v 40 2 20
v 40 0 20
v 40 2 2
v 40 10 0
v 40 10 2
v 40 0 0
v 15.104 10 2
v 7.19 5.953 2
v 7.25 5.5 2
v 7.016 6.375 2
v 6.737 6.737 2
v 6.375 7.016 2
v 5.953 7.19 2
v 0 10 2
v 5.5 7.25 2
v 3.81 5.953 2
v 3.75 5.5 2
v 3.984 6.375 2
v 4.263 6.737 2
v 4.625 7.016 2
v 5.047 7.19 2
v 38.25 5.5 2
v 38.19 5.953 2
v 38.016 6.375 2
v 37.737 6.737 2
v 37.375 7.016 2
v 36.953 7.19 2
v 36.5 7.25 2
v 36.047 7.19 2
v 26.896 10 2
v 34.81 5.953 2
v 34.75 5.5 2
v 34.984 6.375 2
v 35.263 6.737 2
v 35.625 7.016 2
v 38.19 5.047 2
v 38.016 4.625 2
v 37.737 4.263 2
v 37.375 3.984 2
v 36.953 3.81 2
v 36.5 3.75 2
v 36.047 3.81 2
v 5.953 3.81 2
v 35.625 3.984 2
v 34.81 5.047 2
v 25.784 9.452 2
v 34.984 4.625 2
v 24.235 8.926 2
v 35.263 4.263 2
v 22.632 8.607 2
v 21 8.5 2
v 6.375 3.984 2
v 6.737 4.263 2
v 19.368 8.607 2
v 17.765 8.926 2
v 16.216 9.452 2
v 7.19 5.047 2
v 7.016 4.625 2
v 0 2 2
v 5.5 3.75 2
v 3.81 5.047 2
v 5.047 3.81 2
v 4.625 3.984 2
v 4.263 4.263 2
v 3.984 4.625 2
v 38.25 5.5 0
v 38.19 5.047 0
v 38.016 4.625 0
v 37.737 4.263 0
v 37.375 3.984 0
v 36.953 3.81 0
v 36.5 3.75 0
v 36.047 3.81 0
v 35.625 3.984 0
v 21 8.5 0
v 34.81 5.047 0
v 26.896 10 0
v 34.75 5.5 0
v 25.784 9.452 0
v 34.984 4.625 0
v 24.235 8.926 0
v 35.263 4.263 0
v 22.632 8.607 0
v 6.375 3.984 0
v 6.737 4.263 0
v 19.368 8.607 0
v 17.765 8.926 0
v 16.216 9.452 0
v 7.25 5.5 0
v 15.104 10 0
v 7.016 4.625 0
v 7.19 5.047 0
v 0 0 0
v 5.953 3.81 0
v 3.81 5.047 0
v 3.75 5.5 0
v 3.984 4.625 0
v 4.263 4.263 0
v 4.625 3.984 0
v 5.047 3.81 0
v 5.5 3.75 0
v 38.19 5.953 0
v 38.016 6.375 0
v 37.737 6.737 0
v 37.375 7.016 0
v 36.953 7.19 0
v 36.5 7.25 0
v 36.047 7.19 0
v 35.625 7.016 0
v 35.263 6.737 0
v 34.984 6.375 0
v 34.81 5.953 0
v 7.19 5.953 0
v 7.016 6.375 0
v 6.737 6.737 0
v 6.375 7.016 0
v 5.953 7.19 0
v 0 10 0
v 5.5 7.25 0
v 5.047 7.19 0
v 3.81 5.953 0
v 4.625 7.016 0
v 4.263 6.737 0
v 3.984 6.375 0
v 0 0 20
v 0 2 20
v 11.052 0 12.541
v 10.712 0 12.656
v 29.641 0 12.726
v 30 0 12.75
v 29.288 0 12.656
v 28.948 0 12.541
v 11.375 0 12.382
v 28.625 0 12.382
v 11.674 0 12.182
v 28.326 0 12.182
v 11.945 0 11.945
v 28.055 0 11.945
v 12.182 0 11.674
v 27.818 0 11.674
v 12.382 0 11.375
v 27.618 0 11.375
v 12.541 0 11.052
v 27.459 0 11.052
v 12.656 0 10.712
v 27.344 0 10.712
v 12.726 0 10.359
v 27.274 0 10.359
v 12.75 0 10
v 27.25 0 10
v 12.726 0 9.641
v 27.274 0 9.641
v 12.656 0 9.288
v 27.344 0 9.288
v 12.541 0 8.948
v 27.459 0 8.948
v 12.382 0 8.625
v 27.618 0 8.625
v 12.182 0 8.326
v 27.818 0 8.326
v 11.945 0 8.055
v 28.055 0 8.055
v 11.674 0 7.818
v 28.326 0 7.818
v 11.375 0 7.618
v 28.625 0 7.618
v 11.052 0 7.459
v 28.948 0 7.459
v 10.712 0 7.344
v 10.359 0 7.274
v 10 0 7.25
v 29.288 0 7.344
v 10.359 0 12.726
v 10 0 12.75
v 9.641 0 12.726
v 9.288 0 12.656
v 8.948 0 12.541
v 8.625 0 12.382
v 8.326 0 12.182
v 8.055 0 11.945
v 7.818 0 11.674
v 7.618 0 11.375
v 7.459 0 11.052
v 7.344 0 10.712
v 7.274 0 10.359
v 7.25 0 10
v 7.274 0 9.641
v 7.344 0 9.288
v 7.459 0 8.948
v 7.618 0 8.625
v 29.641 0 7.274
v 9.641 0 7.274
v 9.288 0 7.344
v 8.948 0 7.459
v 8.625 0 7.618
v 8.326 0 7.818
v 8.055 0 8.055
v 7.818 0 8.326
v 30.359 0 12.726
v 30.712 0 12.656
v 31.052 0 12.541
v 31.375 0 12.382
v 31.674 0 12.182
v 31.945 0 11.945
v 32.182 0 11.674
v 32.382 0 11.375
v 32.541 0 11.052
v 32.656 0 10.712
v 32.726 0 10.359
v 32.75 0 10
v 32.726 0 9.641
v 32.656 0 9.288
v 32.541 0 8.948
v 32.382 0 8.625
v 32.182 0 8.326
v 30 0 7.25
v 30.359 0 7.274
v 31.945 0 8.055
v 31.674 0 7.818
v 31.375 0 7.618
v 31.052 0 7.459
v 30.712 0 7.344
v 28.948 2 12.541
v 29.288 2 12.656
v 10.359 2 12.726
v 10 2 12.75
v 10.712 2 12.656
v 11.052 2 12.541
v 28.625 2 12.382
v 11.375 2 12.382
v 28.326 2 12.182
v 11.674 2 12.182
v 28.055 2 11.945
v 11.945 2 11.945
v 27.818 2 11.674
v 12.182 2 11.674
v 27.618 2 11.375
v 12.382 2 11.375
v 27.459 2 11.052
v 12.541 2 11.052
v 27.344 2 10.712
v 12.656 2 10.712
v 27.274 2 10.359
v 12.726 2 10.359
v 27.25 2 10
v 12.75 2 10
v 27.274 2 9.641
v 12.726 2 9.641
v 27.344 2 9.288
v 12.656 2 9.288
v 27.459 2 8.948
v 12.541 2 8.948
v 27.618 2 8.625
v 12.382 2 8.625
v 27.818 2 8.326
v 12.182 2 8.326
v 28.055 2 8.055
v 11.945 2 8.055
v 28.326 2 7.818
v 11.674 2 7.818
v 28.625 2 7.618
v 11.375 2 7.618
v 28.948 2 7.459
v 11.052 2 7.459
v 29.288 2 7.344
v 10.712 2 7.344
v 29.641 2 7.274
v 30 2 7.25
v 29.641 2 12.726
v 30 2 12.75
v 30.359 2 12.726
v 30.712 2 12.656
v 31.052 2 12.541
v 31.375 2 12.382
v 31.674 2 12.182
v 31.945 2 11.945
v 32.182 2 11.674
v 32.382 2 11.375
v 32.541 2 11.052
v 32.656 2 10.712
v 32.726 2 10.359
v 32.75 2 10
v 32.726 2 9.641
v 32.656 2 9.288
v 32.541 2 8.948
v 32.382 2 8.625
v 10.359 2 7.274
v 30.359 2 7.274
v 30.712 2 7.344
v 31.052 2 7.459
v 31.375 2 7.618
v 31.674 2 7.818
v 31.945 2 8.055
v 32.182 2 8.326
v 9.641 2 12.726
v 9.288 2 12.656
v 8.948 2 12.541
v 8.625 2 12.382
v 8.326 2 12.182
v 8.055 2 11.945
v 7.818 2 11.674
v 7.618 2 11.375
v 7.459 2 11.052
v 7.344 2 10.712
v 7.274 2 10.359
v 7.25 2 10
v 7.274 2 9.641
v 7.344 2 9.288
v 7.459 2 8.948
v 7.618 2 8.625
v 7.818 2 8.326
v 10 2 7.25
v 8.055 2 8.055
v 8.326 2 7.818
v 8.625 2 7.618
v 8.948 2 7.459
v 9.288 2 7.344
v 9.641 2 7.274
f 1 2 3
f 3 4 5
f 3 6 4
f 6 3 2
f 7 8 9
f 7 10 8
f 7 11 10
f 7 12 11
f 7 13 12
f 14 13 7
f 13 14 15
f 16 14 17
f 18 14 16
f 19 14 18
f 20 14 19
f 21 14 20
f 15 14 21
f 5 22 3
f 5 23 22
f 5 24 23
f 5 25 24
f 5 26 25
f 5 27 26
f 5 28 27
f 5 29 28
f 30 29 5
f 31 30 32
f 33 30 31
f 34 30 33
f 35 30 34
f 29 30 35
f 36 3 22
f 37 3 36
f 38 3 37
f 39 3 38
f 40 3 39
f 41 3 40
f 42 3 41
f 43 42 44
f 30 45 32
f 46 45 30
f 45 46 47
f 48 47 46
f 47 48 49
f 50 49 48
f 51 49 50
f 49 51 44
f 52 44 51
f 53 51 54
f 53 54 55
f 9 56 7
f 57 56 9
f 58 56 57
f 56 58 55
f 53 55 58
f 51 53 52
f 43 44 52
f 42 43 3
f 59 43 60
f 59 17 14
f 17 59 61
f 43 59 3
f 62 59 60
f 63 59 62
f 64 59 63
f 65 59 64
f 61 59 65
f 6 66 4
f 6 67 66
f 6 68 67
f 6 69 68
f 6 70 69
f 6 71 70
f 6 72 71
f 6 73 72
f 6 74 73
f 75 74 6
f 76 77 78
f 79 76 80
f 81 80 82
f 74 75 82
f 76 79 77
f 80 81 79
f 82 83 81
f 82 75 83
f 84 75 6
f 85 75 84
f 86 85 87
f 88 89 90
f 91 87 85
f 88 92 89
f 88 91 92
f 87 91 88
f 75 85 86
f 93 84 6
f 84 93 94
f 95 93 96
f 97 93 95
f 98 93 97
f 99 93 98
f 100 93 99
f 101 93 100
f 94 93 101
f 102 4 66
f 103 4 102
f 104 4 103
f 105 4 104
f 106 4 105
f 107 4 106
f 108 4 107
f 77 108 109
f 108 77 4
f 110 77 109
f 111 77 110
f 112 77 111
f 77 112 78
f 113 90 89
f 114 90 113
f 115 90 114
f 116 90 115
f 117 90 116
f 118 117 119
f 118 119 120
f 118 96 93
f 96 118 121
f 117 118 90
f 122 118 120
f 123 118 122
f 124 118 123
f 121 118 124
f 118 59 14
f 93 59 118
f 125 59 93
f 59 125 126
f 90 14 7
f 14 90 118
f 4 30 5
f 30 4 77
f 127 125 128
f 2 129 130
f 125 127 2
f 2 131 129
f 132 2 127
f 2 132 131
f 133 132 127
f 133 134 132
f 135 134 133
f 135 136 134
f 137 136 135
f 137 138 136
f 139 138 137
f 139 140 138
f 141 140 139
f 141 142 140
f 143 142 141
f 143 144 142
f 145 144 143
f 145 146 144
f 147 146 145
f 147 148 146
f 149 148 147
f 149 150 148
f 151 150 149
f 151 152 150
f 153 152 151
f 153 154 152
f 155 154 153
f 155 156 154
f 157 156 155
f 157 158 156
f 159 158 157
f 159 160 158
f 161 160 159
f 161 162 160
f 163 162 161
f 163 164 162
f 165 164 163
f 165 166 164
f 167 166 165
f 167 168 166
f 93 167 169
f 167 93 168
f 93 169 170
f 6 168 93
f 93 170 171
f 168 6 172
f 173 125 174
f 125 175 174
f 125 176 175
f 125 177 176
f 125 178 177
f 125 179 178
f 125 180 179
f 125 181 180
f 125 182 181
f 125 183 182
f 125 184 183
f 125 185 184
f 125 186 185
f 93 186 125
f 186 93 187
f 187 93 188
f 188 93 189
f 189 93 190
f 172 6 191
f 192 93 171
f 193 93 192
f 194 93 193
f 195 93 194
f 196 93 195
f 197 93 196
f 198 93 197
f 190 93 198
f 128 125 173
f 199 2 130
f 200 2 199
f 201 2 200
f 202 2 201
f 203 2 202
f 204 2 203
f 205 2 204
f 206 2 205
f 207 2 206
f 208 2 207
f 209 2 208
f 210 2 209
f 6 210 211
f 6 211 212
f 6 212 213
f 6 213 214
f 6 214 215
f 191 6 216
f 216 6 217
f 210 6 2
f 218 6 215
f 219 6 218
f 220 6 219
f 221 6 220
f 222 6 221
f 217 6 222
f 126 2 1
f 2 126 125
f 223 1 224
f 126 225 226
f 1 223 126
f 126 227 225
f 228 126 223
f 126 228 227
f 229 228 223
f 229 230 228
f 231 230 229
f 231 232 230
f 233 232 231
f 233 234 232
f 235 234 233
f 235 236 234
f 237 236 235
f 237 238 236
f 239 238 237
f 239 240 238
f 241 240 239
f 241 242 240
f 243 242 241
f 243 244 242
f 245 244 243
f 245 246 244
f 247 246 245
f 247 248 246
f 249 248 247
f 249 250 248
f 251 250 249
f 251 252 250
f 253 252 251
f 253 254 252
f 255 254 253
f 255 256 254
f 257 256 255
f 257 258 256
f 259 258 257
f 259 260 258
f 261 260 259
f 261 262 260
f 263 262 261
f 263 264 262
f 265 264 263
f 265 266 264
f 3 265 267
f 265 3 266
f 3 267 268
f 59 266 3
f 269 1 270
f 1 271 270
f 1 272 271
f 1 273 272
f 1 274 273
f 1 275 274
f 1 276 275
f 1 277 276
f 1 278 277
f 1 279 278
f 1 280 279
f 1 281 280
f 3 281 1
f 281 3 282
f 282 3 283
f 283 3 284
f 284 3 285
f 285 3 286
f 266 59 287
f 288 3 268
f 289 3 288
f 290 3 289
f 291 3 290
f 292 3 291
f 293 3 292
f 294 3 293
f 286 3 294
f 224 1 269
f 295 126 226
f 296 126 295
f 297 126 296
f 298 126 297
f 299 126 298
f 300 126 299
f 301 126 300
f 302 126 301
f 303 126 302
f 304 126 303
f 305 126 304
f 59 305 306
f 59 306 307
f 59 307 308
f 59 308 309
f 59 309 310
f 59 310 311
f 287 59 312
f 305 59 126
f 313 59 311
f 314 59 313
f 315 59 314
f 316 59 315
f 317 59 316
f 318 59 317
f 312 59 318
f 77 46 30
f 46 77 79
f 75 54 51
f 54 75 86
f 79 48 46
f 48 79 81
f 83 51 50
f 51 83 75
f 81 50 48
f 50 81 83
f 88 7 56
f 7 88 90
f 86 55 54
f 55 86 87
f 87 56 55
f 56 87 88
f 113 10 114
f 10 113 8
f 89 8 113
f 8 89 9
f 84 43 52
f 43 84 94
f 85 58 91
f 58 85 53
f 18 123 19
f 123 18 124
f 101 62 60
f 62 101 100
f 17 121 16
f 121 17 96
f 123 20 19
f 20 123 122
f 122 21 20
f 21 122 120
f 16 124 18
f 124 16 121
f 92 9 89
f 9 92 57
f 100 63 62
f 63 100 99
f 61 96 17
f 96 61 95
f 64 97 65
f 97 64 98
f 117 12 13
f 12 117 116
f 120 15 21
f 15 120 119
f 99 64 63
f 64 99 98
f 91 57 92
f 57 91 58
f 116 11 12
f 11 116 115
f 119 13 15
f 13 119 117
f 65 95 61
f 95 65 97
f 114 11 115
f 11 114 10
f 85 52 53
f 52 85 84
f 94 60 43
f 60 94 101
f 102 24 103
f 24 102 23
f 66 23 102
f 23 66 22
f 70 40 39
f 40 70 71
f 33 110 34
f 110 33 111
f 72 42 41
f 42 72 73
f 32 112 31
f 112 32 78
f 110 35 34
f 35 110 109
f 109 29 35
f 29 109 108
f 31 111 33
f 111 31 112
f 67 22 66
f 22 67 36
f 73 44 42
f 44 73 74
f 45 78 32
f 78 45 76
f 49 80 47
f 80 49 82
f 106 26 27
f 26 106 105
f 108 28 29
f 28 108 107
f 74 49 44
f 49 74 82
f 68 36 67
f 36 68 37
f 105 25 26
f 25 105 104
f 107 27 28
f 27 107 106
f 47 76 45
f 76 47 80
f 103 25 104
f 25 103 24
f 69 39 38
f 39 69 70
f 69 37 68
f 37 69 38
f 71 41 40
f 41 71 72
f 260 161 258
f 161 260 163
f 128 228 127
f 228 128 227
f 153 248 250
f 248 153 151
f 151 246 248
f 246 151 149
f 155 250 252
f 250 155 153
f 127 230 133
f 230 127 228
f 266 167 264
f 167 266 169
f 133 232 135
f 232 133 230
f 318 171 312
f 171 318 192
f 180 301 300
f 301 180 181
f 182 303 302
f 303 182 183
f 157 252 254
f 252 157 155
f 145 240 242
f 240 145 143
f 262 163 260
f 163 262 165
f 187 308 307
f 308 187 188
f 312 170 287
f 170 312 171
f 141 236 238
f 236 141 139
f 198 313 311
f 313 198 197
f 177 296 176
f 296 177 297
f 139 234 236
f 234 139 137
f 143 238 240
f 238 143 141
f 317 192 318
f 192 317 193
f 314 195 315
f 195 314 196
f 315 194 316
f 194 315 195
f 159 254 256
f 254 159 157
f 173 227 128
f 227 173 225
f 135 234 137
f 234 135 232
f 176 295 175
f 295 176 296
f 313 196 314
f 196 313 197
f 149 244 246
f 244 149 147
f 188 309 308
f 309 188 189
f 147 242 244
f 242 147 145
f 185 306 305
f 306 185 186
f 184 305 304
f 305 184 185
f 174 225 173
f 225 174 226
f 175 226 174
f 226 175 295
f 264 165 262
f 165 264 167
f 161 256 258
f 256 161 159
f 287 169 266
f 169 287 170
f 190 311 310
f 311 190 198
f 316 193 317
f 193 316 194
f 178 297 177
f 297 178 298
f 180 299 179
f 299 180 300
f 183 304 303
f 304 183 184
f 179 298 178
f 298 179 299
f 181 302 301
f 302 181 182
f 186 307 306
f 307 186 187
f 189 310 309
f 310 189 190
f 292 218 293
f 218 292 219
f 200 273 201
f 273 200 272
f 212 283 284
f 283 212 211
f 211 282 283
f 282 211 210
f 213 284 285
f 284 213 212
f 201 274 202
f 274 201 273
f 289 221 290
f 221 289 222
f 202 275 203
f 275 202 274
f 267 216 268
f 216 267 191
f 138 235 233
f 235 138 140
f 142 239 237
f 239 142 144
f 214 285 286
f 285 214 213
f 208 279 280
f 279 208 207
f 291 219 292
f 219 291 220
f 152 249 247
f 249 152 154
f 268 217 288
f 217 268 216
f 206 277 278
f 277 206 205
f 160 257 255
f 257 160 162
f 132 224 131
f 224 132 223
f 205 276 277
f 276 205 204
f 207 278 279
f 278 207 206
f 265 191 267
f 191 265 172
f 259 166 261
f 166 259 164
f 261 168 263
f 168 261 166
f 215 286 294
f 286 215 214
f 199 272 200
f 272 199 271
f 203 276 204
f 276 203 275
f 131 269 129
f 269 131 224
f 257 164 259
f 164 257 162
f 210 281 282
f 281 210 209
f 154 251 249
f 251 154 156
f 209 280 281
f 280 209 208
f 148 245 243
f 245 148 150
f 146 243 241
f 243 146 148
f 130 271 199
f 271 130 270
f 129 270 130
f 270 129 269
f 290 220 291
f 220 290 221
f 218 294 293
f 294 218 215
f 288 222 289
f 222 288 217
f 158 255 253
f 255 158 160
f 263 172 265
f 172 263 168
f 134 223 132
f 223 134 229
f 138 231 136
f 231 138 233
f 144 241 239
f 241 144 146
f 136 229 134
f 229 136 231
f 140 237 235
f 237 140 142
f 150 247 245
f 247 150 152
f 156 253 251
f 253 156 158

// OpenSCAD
difference()
{
    union()
    {
        cube([40,10,2]);
        
        cube([40,2,20]);
    }
    union()
    {
        translate([21,21,0])
            cylinder(d=25,h=2,$fn=48);
        
        translate([5.5,5.5,0])
            cylinder(d=3.5,h=2,$fn=24);
        
        translate([5.5+31,5.5,0])
            cylinder(d=3.5,h=2,$fn=24);
        
        translate([10,0,10])
            rotate([270,0,0])
                cylinder(d=5.5,h=3,$fn=48);
        
        translate([30,0,10])
            rotate([270,0,0])
                cylinder(d=5.5,h=3,$fn=48);
    }
}
